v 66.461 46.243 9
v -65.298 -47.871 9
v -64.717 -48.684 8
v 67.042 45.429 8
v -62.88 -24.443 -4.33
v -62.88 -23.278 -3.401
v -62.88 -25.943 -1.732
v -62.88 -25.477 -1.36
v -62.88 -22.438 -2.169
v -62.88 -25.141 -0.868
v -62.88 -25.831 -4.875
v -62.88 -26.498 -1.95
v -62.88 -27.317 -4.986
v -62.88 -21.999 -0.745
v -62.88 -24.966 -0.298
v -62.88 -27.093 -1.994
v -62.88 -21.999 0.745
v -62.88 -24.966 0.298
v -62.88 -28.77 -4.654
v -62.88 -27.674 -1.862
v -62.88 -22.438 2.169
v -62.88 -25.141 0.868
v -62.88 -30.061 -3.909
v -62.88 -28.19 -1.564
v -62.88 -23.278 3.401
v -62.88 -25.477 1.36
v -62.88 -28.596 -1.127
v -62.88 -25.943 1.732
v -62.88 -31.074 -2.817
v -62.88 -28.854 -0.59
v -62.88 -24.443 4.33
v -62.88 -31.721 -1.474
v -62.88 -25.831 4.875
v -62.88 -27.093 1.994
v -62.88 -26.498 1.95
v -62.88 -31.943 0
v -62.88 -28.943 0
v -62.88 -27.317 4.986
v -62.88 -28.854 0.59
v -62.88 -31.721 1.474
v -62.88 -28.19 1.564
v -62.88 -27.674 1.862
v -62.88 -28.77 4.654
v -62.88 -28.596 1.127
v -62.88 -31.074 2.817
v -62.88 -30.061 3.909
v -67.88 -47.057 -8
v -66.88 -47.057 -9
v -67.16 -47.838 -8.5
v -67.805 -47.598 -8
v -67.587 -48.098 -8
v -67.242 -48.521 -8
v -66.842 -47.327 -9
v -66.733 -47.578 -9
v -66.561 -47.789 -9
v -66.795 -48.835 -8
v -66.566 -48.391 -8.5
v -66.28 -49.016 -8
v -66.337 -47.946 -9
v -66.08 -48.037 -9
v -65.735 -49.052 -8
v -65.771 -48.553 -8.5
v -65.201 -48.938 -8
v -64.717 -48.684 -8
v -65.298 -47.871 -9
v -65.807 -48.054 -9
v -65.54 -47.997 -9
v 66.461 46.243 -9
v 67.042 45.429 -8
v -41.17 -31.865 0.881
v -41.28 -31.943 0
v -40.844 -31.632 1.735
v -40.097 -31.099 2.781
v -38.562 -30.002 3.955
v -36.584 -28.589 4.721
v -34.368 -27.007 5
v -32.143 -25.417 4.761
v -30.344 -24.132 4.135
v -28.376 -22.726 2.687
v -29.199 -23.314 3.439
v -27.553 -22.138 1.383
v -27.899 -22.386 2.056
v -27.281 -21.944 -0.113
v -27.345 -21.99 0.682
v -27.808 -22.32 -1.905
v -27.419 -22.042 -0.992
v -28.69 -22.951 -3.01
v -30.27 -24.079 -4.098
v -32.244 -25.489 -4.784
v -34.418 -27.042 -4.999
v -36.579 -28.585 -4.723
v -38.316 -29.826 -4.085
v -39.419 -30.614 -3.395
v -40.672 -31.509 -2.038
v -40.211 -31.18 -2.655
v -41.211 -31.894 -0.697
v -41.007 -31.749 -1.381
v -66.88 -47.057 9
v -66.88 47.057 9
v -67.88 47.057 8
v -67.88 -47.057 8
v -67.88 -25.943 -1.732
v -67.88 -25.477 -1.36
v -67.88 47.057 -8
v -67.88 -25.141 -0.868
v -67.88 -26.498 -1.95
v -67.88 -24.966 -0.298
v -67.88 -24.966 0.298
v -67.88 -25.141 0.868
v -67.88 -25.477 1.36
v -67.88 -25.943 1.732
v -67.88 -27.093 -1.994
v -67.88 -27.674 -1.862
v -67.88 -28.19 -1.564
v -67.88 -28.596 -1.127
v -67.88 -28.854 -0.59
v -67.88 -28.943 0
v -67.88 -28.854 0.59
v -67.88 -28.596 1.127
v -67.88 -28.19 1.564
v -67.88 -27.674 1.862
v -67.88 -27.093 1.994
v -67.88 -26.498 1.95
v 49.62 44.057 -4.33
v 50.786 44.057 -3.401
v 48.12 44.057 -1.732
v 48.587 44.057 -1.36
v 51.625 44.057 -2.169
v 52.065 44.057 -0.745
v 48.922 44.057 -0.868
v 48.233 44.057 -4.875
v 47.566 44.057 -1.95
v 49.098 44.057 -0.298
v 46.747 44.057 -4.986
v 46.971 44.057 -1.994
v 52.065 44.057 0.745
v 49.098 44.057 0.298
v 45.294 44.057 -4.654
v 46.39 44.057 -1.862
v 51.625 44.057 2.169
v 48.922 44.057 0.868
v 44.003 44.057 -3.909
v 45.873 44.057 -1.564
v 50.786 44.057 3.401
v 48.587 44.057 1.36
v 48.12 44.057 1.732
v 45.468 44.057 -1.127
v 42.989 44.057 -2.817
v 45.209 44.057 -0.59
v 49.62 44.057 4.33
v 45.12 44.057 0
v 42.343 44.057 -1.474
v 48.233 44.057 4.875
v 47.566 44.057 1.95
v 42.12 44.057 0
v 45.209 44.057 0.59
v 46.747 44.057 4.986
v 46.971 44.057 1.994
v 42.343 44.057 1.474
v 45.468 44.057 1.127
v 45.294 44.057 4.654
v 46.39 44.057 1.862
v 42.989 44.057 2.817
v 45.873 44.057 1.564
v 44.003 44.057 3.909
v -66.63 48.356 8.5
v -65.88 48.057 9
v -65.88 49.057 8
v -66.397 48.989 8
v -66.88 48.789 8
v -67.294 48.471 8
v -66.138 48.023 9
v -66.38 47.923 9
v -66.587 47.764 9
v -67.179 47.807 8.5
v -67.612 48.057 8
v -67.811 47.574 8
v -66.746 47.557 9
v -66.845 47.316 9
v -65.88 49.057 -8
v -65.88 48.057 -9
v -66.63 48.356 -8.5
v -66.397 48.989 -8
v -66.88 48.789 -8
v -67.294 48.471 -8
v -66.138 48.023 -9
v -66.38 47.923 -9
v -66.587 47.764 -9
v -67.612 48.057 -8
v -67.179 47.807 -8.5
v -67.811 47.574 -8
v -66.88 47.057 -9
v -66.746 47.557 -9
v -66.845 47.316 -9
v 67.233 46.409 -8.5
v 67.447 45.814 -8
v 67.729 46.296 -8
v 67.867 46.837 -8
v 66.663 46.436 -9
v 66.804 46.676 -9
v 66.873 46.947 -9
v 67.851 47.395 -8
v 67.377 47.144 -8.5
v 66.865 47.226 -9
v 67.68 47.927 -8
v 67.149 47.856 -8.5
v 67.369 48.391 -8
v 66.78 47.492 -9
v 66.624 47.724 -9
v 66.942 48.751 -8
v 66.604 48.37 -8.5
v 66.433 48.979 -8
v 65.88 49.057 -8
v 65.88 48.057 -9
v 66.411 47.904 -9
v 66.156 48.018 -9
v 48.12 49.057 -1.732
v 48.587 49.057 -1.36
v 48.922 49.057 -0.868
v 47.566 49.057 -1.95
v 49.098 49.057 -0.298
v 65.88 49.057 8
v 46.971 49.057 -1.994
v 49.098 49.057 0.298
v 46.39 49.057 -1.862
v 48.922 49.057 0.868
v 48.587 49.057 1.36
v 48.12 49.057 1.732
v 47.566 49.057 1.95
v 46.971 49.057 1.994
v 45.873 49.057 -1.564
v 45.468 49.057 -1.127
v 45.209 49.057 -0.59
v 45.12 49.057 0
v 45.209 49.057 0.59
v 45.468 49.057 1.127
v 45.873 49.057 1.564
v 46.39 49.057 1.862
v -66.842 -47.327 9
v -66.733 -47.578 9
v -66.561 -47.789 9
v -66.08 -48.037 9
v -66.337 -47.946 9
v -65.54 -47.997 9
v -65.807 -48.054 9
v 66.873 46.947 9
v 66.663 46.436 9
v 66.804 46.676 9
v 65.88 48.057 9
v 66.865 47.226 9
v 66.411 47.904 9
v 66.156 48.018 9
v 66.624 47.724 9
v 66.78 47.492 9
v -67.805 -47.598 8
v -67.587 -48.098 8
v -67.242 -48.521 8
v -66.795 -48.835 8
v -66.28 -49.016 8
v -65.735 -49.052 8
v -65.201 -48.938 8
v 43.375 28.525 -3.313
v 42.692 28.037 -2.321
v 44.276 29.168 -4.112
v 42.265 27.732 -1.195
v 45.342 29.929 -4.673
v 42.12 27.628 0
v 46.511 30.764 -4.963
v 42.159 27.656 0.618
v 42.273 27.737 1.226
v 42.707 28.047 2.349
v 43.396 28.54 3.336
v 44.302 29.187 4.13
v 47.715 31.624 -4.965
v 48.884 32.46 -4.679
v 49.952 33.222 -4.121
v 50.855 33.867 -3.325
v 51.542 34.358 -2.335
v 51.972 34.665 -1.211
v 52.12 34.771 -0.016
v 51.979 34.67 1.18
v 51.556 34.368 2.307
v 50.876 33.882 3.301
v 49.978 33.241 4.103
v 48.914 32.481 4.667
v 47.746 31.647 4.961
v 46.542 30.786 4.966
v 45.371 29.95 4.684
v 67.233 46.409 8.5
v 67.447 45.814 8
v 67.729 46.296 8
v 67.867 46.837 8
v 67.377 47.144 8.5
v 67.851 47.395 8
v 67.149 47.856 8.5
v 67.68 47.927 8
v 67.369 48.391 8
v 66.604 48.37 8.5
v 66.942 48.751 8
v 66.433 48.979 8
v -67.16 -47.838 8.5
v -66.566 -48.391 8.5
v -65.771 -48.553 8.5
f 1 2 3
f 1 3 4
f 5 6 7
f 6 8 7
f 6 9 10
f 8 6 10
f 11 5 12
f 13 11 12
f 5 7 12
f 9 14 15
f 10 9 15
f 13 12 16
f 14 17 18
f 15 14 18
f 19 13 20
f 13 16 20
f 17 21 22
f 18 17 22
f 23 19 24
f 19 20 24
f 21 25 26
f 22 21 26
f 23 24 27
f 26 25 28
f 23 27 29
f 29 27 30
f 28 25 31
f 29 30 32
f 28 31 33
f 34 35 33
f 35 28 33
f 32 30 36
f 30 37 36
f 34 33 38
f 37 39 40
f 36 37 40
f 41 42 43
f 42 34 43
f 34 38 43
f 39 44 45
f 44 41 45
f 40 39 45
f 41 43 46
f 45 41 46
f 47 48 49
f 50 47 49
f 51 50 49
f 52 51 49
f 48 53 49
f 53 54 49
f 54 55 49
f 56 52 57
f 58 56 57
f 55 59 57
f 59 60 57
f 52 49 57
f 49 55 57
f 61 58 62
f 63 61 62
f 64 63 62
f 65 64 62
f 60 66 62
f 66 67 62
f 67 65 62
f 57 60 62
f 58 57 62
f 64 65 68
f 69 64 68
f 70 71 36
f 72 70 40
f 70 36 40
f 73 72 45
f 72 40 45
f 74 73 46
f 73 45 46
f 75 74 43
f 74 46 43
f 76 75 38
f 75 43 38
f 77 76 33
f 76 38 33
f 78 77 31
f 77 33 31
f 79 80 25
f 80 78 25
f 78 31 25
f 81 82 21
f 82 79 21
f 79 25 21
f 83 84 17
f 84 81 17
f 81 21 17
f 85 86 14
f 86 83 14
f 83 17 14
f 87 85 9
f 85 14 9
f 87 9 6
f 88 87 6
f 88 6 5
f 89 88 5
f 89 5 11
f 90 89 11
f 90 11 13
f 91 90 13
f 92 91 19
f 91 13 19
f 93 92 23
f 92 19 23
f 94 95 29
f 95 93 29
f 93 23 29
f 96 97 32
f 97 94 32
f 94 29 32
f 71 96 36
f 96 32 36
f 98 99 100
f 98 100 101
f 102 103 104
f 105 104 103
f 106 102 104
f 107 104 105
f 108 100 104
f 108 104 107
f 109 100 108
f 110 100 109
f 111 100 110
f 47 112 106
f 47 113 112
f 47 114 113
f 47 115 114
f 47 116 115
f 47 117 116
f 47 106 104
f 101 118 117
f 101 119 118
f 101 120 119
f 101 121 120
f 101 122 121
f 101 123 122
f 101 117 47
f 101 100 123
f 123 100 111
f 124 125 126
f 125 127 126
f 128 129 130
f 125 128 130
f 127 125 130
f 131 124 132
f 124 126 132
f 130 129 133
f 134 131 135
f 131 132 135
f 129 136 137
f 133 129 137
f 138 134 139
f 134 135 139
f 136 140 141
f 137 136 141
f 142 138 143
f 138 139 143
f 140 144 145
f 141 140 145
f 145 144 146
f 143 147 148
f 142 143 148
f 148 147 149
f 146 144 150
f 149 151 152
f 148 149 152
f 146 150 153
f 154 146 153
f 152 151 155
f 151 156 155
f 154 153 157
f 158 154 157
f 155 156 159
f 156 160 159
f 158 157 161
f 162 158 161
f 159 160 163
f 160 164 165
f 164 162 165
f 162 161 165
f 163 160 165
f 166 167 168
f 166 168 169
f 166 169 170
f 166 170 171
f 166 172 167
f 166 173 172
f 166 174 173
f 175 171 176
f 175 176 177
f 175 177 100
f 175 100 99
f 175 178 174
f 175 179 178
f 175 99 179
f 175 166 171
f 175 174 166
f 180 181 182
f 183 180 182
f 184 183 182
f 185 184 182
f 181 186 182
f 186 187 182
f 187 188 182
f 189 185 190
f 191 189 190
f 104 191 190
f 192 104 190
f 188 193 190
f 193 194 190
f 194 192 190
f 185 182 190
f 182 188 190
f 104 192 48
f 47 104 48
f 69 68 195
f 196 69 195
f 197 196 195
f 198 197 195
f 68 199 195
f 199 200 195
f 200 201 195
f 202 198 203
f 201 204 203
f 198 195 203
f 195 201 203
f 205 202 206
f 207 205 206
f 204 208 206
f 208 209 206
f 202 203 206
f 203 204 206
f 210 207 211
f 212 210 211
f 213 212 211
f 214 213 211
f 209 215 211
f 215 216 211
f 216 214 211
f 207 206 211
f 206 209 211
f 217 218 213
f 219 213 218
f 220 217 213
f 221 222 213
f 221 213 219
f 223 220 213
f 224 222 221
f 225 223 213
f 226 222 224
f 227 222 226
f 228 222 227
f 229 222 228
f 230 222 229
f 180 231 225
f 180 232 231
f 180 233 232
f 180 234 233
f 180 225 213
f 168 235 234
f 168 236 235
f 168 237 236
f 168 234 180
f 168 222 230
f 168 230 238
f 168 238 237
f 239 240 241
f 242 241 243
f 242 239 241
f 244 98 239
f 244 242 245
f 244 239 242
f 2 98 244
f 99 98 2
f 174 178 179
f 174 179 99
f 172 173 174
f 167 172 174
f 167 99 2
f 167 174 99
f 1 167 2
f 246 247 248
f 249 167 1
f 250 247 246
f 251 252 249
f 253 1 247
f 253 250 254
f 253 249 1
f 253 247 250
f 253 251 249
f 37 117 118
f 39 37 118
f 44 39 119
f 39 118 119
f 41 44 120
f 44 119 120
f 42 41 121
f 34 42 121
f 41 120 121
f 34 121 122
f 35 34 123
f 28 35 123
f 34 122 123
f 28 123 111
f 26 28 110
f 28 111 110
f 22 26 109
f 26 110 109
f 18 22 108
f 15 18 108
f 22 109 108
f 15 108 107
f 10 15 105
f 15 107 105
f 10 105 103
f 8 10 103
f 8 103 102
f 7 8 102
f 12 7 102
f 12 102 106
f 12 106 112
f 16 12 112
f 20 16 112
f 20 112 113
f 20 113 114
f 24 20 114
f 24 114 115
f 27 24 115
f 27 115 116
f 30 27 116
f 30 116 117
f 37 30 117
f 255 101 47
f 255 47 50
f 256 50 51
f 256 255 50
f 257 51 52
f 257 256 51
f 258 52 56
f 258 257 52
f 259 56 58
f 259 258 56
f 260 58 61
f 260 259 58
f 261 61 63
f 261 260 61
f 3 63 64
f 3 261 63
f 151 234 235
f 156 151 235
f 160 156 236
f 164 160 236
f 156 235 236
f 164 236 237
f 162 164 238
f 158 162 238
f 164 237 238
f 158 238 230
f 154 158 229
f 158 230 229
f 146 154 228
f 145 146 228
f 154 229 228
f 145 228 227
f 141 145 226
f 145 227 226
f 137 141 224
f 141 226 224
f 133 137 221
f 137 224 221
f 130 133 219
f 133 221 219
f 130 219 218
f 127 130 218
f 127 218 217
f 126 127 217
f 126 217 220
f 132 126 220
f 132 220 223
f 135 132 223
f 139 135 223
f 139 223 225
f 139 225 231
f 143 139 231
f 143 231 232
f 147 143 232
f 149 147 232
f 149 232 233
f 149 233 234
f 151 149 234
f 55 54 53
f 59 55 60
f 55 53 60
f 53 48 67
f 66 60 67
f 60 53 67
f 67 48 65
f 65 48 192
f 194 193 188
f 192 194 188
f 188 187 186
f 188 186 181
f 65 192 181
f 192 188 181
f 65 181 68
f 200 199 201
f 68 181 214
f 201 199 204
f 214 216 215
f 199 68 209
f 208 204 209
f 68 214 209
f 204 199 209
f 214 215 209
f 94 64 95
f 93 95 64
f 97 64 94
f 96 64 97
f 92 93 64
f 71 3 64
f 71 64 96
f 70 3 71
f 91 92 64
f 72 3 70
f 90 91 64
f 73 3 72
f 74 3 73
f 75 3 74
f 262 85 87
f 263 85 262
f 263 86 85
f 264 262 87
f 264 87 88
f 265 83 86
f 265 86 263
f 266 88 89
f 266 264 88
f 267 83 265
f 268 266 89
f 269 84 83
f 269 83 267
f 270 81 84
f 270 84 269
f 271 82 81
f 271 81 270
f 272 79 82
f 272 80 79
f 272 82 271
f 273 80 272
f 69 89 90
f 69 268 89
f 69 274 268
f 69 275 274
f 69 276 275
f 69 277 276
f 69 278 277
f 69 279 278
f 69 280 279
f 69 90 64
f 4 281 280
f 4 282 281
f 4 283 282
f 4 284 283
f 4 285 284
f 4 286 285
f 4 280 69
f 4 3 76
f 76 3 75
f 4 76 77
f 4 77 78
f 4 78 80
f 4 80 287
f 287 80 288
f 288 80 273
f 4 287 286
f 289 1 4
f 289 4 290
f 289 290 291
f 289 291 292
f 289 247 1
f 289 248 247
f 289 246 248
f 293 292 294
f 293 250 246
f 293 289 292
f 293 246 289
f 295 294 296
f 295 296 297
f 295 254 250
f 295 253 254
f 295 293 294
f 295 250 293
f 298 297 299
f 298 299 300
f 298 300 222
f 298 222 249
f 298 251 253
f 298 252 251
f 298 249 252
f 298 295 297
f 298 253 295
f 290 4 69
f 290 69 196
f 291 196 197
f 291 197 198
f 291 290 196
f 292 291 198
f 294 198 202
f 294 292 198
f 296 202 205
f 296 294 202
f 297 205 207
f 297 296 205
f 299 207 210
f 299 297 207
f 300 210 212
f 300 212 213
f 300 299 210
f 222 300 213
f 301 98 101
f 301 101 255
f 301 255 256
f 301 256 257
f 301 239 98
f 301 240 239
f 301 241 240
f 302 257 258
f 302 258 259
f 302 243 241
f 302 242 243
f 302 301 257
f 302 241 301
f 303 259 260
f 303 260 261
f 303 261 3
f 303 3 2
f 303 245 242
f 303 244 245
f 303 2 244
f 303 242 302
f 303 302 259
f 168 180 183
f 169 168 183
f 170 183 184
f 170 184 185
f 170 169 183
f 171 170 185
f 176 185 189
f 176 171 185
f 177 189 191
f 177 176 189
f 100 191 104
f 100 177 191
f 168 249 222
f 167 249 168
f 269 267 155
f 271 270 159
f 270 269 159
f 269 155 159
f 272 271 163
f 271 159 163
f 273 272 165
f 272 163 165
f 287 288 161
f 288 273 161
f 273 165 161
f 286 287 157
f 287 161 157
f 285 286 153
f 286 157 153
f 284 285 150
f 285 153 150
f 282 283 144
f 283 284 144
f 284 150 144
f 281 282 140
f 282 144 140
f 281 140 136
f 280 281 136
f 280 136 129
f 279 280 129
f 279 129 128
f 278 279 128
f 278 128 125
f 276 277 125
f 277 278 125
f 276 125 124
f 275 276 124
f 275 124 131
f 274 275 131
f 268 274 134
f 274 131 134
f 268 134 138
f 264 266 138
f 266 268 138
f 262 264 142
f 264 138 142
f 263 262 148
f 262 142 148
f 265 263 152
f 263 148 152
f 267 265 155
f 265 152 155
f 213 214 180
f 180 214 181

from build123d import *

# Parameters (mm, degrees)
PAD_DEPTH       = 9
SKETCH001_R     = 2
POCKET_DEPTH    = 135.76007
SKETCH002_R     = 2
POCKET001_DEPTH = 98.114621
SKETCH003_R     = 5
POCKET002_DEPTH = 93.114621
SKETCH004_R     = 5
POCKET003_DEPTH = 130.76007
CHAMFER_SIZE    = 1


with BuildPart() as part:
    # Sketch → Pad (new body, symmetric)
    with BuildSketch(Plane.XY):
        with BuildLine():
            Line((65.879535, 49.056811), (-65.879535, 49.056811))
            ThreePointArc((-65.879535, 49.056811), (-67.293749, 48.471024), (-67.879535, 47.056811))
            Line((-67.879535, 47.056811), (-67.879535, -47.056811))
            ThreePointArc((-67.879535, -47.056811), (-66.794698, -48.835146), (-64.717059, -48.684278))
            Line((-64.717059, -48.684278), (67.042011, 45.429344))
            ThreePointArc((67.042011, 45.429344), (67.784126, 47.667166), (65.879535, 49.056811))
        make_face()
    extrude(amount=PAD_DEPTH, both=True)

    # Sketch001 (on Face3 of Pad) → Pocket (cut, through all)
    with BuildSketch(Plane(origin=(-67.879535, 0, 0), x_dir=(0, -1, 0), z_dir=(-1, 0, 0))):
        with Locations((26.943189, 0)):
            Circle(SKETCH001_R)
    extrude(amount=-POCKET_DEPTH, mode=Mode.SUBTRACT)

    # Sketch002 (on Face1 of Pocket) → Pocket001 (cut, through all)
    with BuildSketch(Plane(origin=(0, 49.056811, 0), x_dir=(-1, 0, 0), z_dir=(0, 1, 0))):
        with Locations((-47.120465, 0)):
            Circle(SKETCH002_R)
    extrude(amount=-POCKET001_DEPTH, mode=Mode.SUBTRACT)

    # Sketch003 (on Face1 of Pocket001) → Pocket002 (cut, through all)
    with BuildSketch(Plane(origin=(0, 44.056811, 0), x_dir=(-1, 0, 0), z_dir=(0, 1, 0))):
        with Locations((-47.120465, 0)):
            Circle(SKETCH003_R)
    extrude(amount=-POCKET002_DEPTH, mode=Mode.SUBTRACT)

    # Sketch004 (on Face8 of Pocket002) → Pocket003 (cut, through all)
    with BuildSketch(Plane(origin=(-62.879535, 0, 0), x_dir=(0, -1, 0), z_dir=(-1, 0, 0))):
        with Locations((26.943189, 0)):
            Circle(SKETCH004_R)
    extrude(amount=-POCKET003_DEPTH, mode=Mode.SUBTRACT)

    # Chamfer
    chamfer_edges = [part.edges().sort_by_distance(p)[0] for p in [
        (0, 49.056811, 9),
        (-67.293749, 48.471024, 9),
        (-67.879535, 0, 9),
        (-66.794698, -48.835146, 9),
        (1.162476, -1.627467, 9),
        (67.784126, 47.667166, 9),
        (0, 49.056811, -9),
        (-67.293749, 48.471024, -9),
        (-67.879535, 0, -9),
        (-66.794698, -48.835146, -9),
        (1.162476, -1.627467, -9),
        (67.784126, 47.667166, -9),
    ]]
    chamfer(chamfer_edges, length=CHAMFER_SIZE)


solid = part.part
